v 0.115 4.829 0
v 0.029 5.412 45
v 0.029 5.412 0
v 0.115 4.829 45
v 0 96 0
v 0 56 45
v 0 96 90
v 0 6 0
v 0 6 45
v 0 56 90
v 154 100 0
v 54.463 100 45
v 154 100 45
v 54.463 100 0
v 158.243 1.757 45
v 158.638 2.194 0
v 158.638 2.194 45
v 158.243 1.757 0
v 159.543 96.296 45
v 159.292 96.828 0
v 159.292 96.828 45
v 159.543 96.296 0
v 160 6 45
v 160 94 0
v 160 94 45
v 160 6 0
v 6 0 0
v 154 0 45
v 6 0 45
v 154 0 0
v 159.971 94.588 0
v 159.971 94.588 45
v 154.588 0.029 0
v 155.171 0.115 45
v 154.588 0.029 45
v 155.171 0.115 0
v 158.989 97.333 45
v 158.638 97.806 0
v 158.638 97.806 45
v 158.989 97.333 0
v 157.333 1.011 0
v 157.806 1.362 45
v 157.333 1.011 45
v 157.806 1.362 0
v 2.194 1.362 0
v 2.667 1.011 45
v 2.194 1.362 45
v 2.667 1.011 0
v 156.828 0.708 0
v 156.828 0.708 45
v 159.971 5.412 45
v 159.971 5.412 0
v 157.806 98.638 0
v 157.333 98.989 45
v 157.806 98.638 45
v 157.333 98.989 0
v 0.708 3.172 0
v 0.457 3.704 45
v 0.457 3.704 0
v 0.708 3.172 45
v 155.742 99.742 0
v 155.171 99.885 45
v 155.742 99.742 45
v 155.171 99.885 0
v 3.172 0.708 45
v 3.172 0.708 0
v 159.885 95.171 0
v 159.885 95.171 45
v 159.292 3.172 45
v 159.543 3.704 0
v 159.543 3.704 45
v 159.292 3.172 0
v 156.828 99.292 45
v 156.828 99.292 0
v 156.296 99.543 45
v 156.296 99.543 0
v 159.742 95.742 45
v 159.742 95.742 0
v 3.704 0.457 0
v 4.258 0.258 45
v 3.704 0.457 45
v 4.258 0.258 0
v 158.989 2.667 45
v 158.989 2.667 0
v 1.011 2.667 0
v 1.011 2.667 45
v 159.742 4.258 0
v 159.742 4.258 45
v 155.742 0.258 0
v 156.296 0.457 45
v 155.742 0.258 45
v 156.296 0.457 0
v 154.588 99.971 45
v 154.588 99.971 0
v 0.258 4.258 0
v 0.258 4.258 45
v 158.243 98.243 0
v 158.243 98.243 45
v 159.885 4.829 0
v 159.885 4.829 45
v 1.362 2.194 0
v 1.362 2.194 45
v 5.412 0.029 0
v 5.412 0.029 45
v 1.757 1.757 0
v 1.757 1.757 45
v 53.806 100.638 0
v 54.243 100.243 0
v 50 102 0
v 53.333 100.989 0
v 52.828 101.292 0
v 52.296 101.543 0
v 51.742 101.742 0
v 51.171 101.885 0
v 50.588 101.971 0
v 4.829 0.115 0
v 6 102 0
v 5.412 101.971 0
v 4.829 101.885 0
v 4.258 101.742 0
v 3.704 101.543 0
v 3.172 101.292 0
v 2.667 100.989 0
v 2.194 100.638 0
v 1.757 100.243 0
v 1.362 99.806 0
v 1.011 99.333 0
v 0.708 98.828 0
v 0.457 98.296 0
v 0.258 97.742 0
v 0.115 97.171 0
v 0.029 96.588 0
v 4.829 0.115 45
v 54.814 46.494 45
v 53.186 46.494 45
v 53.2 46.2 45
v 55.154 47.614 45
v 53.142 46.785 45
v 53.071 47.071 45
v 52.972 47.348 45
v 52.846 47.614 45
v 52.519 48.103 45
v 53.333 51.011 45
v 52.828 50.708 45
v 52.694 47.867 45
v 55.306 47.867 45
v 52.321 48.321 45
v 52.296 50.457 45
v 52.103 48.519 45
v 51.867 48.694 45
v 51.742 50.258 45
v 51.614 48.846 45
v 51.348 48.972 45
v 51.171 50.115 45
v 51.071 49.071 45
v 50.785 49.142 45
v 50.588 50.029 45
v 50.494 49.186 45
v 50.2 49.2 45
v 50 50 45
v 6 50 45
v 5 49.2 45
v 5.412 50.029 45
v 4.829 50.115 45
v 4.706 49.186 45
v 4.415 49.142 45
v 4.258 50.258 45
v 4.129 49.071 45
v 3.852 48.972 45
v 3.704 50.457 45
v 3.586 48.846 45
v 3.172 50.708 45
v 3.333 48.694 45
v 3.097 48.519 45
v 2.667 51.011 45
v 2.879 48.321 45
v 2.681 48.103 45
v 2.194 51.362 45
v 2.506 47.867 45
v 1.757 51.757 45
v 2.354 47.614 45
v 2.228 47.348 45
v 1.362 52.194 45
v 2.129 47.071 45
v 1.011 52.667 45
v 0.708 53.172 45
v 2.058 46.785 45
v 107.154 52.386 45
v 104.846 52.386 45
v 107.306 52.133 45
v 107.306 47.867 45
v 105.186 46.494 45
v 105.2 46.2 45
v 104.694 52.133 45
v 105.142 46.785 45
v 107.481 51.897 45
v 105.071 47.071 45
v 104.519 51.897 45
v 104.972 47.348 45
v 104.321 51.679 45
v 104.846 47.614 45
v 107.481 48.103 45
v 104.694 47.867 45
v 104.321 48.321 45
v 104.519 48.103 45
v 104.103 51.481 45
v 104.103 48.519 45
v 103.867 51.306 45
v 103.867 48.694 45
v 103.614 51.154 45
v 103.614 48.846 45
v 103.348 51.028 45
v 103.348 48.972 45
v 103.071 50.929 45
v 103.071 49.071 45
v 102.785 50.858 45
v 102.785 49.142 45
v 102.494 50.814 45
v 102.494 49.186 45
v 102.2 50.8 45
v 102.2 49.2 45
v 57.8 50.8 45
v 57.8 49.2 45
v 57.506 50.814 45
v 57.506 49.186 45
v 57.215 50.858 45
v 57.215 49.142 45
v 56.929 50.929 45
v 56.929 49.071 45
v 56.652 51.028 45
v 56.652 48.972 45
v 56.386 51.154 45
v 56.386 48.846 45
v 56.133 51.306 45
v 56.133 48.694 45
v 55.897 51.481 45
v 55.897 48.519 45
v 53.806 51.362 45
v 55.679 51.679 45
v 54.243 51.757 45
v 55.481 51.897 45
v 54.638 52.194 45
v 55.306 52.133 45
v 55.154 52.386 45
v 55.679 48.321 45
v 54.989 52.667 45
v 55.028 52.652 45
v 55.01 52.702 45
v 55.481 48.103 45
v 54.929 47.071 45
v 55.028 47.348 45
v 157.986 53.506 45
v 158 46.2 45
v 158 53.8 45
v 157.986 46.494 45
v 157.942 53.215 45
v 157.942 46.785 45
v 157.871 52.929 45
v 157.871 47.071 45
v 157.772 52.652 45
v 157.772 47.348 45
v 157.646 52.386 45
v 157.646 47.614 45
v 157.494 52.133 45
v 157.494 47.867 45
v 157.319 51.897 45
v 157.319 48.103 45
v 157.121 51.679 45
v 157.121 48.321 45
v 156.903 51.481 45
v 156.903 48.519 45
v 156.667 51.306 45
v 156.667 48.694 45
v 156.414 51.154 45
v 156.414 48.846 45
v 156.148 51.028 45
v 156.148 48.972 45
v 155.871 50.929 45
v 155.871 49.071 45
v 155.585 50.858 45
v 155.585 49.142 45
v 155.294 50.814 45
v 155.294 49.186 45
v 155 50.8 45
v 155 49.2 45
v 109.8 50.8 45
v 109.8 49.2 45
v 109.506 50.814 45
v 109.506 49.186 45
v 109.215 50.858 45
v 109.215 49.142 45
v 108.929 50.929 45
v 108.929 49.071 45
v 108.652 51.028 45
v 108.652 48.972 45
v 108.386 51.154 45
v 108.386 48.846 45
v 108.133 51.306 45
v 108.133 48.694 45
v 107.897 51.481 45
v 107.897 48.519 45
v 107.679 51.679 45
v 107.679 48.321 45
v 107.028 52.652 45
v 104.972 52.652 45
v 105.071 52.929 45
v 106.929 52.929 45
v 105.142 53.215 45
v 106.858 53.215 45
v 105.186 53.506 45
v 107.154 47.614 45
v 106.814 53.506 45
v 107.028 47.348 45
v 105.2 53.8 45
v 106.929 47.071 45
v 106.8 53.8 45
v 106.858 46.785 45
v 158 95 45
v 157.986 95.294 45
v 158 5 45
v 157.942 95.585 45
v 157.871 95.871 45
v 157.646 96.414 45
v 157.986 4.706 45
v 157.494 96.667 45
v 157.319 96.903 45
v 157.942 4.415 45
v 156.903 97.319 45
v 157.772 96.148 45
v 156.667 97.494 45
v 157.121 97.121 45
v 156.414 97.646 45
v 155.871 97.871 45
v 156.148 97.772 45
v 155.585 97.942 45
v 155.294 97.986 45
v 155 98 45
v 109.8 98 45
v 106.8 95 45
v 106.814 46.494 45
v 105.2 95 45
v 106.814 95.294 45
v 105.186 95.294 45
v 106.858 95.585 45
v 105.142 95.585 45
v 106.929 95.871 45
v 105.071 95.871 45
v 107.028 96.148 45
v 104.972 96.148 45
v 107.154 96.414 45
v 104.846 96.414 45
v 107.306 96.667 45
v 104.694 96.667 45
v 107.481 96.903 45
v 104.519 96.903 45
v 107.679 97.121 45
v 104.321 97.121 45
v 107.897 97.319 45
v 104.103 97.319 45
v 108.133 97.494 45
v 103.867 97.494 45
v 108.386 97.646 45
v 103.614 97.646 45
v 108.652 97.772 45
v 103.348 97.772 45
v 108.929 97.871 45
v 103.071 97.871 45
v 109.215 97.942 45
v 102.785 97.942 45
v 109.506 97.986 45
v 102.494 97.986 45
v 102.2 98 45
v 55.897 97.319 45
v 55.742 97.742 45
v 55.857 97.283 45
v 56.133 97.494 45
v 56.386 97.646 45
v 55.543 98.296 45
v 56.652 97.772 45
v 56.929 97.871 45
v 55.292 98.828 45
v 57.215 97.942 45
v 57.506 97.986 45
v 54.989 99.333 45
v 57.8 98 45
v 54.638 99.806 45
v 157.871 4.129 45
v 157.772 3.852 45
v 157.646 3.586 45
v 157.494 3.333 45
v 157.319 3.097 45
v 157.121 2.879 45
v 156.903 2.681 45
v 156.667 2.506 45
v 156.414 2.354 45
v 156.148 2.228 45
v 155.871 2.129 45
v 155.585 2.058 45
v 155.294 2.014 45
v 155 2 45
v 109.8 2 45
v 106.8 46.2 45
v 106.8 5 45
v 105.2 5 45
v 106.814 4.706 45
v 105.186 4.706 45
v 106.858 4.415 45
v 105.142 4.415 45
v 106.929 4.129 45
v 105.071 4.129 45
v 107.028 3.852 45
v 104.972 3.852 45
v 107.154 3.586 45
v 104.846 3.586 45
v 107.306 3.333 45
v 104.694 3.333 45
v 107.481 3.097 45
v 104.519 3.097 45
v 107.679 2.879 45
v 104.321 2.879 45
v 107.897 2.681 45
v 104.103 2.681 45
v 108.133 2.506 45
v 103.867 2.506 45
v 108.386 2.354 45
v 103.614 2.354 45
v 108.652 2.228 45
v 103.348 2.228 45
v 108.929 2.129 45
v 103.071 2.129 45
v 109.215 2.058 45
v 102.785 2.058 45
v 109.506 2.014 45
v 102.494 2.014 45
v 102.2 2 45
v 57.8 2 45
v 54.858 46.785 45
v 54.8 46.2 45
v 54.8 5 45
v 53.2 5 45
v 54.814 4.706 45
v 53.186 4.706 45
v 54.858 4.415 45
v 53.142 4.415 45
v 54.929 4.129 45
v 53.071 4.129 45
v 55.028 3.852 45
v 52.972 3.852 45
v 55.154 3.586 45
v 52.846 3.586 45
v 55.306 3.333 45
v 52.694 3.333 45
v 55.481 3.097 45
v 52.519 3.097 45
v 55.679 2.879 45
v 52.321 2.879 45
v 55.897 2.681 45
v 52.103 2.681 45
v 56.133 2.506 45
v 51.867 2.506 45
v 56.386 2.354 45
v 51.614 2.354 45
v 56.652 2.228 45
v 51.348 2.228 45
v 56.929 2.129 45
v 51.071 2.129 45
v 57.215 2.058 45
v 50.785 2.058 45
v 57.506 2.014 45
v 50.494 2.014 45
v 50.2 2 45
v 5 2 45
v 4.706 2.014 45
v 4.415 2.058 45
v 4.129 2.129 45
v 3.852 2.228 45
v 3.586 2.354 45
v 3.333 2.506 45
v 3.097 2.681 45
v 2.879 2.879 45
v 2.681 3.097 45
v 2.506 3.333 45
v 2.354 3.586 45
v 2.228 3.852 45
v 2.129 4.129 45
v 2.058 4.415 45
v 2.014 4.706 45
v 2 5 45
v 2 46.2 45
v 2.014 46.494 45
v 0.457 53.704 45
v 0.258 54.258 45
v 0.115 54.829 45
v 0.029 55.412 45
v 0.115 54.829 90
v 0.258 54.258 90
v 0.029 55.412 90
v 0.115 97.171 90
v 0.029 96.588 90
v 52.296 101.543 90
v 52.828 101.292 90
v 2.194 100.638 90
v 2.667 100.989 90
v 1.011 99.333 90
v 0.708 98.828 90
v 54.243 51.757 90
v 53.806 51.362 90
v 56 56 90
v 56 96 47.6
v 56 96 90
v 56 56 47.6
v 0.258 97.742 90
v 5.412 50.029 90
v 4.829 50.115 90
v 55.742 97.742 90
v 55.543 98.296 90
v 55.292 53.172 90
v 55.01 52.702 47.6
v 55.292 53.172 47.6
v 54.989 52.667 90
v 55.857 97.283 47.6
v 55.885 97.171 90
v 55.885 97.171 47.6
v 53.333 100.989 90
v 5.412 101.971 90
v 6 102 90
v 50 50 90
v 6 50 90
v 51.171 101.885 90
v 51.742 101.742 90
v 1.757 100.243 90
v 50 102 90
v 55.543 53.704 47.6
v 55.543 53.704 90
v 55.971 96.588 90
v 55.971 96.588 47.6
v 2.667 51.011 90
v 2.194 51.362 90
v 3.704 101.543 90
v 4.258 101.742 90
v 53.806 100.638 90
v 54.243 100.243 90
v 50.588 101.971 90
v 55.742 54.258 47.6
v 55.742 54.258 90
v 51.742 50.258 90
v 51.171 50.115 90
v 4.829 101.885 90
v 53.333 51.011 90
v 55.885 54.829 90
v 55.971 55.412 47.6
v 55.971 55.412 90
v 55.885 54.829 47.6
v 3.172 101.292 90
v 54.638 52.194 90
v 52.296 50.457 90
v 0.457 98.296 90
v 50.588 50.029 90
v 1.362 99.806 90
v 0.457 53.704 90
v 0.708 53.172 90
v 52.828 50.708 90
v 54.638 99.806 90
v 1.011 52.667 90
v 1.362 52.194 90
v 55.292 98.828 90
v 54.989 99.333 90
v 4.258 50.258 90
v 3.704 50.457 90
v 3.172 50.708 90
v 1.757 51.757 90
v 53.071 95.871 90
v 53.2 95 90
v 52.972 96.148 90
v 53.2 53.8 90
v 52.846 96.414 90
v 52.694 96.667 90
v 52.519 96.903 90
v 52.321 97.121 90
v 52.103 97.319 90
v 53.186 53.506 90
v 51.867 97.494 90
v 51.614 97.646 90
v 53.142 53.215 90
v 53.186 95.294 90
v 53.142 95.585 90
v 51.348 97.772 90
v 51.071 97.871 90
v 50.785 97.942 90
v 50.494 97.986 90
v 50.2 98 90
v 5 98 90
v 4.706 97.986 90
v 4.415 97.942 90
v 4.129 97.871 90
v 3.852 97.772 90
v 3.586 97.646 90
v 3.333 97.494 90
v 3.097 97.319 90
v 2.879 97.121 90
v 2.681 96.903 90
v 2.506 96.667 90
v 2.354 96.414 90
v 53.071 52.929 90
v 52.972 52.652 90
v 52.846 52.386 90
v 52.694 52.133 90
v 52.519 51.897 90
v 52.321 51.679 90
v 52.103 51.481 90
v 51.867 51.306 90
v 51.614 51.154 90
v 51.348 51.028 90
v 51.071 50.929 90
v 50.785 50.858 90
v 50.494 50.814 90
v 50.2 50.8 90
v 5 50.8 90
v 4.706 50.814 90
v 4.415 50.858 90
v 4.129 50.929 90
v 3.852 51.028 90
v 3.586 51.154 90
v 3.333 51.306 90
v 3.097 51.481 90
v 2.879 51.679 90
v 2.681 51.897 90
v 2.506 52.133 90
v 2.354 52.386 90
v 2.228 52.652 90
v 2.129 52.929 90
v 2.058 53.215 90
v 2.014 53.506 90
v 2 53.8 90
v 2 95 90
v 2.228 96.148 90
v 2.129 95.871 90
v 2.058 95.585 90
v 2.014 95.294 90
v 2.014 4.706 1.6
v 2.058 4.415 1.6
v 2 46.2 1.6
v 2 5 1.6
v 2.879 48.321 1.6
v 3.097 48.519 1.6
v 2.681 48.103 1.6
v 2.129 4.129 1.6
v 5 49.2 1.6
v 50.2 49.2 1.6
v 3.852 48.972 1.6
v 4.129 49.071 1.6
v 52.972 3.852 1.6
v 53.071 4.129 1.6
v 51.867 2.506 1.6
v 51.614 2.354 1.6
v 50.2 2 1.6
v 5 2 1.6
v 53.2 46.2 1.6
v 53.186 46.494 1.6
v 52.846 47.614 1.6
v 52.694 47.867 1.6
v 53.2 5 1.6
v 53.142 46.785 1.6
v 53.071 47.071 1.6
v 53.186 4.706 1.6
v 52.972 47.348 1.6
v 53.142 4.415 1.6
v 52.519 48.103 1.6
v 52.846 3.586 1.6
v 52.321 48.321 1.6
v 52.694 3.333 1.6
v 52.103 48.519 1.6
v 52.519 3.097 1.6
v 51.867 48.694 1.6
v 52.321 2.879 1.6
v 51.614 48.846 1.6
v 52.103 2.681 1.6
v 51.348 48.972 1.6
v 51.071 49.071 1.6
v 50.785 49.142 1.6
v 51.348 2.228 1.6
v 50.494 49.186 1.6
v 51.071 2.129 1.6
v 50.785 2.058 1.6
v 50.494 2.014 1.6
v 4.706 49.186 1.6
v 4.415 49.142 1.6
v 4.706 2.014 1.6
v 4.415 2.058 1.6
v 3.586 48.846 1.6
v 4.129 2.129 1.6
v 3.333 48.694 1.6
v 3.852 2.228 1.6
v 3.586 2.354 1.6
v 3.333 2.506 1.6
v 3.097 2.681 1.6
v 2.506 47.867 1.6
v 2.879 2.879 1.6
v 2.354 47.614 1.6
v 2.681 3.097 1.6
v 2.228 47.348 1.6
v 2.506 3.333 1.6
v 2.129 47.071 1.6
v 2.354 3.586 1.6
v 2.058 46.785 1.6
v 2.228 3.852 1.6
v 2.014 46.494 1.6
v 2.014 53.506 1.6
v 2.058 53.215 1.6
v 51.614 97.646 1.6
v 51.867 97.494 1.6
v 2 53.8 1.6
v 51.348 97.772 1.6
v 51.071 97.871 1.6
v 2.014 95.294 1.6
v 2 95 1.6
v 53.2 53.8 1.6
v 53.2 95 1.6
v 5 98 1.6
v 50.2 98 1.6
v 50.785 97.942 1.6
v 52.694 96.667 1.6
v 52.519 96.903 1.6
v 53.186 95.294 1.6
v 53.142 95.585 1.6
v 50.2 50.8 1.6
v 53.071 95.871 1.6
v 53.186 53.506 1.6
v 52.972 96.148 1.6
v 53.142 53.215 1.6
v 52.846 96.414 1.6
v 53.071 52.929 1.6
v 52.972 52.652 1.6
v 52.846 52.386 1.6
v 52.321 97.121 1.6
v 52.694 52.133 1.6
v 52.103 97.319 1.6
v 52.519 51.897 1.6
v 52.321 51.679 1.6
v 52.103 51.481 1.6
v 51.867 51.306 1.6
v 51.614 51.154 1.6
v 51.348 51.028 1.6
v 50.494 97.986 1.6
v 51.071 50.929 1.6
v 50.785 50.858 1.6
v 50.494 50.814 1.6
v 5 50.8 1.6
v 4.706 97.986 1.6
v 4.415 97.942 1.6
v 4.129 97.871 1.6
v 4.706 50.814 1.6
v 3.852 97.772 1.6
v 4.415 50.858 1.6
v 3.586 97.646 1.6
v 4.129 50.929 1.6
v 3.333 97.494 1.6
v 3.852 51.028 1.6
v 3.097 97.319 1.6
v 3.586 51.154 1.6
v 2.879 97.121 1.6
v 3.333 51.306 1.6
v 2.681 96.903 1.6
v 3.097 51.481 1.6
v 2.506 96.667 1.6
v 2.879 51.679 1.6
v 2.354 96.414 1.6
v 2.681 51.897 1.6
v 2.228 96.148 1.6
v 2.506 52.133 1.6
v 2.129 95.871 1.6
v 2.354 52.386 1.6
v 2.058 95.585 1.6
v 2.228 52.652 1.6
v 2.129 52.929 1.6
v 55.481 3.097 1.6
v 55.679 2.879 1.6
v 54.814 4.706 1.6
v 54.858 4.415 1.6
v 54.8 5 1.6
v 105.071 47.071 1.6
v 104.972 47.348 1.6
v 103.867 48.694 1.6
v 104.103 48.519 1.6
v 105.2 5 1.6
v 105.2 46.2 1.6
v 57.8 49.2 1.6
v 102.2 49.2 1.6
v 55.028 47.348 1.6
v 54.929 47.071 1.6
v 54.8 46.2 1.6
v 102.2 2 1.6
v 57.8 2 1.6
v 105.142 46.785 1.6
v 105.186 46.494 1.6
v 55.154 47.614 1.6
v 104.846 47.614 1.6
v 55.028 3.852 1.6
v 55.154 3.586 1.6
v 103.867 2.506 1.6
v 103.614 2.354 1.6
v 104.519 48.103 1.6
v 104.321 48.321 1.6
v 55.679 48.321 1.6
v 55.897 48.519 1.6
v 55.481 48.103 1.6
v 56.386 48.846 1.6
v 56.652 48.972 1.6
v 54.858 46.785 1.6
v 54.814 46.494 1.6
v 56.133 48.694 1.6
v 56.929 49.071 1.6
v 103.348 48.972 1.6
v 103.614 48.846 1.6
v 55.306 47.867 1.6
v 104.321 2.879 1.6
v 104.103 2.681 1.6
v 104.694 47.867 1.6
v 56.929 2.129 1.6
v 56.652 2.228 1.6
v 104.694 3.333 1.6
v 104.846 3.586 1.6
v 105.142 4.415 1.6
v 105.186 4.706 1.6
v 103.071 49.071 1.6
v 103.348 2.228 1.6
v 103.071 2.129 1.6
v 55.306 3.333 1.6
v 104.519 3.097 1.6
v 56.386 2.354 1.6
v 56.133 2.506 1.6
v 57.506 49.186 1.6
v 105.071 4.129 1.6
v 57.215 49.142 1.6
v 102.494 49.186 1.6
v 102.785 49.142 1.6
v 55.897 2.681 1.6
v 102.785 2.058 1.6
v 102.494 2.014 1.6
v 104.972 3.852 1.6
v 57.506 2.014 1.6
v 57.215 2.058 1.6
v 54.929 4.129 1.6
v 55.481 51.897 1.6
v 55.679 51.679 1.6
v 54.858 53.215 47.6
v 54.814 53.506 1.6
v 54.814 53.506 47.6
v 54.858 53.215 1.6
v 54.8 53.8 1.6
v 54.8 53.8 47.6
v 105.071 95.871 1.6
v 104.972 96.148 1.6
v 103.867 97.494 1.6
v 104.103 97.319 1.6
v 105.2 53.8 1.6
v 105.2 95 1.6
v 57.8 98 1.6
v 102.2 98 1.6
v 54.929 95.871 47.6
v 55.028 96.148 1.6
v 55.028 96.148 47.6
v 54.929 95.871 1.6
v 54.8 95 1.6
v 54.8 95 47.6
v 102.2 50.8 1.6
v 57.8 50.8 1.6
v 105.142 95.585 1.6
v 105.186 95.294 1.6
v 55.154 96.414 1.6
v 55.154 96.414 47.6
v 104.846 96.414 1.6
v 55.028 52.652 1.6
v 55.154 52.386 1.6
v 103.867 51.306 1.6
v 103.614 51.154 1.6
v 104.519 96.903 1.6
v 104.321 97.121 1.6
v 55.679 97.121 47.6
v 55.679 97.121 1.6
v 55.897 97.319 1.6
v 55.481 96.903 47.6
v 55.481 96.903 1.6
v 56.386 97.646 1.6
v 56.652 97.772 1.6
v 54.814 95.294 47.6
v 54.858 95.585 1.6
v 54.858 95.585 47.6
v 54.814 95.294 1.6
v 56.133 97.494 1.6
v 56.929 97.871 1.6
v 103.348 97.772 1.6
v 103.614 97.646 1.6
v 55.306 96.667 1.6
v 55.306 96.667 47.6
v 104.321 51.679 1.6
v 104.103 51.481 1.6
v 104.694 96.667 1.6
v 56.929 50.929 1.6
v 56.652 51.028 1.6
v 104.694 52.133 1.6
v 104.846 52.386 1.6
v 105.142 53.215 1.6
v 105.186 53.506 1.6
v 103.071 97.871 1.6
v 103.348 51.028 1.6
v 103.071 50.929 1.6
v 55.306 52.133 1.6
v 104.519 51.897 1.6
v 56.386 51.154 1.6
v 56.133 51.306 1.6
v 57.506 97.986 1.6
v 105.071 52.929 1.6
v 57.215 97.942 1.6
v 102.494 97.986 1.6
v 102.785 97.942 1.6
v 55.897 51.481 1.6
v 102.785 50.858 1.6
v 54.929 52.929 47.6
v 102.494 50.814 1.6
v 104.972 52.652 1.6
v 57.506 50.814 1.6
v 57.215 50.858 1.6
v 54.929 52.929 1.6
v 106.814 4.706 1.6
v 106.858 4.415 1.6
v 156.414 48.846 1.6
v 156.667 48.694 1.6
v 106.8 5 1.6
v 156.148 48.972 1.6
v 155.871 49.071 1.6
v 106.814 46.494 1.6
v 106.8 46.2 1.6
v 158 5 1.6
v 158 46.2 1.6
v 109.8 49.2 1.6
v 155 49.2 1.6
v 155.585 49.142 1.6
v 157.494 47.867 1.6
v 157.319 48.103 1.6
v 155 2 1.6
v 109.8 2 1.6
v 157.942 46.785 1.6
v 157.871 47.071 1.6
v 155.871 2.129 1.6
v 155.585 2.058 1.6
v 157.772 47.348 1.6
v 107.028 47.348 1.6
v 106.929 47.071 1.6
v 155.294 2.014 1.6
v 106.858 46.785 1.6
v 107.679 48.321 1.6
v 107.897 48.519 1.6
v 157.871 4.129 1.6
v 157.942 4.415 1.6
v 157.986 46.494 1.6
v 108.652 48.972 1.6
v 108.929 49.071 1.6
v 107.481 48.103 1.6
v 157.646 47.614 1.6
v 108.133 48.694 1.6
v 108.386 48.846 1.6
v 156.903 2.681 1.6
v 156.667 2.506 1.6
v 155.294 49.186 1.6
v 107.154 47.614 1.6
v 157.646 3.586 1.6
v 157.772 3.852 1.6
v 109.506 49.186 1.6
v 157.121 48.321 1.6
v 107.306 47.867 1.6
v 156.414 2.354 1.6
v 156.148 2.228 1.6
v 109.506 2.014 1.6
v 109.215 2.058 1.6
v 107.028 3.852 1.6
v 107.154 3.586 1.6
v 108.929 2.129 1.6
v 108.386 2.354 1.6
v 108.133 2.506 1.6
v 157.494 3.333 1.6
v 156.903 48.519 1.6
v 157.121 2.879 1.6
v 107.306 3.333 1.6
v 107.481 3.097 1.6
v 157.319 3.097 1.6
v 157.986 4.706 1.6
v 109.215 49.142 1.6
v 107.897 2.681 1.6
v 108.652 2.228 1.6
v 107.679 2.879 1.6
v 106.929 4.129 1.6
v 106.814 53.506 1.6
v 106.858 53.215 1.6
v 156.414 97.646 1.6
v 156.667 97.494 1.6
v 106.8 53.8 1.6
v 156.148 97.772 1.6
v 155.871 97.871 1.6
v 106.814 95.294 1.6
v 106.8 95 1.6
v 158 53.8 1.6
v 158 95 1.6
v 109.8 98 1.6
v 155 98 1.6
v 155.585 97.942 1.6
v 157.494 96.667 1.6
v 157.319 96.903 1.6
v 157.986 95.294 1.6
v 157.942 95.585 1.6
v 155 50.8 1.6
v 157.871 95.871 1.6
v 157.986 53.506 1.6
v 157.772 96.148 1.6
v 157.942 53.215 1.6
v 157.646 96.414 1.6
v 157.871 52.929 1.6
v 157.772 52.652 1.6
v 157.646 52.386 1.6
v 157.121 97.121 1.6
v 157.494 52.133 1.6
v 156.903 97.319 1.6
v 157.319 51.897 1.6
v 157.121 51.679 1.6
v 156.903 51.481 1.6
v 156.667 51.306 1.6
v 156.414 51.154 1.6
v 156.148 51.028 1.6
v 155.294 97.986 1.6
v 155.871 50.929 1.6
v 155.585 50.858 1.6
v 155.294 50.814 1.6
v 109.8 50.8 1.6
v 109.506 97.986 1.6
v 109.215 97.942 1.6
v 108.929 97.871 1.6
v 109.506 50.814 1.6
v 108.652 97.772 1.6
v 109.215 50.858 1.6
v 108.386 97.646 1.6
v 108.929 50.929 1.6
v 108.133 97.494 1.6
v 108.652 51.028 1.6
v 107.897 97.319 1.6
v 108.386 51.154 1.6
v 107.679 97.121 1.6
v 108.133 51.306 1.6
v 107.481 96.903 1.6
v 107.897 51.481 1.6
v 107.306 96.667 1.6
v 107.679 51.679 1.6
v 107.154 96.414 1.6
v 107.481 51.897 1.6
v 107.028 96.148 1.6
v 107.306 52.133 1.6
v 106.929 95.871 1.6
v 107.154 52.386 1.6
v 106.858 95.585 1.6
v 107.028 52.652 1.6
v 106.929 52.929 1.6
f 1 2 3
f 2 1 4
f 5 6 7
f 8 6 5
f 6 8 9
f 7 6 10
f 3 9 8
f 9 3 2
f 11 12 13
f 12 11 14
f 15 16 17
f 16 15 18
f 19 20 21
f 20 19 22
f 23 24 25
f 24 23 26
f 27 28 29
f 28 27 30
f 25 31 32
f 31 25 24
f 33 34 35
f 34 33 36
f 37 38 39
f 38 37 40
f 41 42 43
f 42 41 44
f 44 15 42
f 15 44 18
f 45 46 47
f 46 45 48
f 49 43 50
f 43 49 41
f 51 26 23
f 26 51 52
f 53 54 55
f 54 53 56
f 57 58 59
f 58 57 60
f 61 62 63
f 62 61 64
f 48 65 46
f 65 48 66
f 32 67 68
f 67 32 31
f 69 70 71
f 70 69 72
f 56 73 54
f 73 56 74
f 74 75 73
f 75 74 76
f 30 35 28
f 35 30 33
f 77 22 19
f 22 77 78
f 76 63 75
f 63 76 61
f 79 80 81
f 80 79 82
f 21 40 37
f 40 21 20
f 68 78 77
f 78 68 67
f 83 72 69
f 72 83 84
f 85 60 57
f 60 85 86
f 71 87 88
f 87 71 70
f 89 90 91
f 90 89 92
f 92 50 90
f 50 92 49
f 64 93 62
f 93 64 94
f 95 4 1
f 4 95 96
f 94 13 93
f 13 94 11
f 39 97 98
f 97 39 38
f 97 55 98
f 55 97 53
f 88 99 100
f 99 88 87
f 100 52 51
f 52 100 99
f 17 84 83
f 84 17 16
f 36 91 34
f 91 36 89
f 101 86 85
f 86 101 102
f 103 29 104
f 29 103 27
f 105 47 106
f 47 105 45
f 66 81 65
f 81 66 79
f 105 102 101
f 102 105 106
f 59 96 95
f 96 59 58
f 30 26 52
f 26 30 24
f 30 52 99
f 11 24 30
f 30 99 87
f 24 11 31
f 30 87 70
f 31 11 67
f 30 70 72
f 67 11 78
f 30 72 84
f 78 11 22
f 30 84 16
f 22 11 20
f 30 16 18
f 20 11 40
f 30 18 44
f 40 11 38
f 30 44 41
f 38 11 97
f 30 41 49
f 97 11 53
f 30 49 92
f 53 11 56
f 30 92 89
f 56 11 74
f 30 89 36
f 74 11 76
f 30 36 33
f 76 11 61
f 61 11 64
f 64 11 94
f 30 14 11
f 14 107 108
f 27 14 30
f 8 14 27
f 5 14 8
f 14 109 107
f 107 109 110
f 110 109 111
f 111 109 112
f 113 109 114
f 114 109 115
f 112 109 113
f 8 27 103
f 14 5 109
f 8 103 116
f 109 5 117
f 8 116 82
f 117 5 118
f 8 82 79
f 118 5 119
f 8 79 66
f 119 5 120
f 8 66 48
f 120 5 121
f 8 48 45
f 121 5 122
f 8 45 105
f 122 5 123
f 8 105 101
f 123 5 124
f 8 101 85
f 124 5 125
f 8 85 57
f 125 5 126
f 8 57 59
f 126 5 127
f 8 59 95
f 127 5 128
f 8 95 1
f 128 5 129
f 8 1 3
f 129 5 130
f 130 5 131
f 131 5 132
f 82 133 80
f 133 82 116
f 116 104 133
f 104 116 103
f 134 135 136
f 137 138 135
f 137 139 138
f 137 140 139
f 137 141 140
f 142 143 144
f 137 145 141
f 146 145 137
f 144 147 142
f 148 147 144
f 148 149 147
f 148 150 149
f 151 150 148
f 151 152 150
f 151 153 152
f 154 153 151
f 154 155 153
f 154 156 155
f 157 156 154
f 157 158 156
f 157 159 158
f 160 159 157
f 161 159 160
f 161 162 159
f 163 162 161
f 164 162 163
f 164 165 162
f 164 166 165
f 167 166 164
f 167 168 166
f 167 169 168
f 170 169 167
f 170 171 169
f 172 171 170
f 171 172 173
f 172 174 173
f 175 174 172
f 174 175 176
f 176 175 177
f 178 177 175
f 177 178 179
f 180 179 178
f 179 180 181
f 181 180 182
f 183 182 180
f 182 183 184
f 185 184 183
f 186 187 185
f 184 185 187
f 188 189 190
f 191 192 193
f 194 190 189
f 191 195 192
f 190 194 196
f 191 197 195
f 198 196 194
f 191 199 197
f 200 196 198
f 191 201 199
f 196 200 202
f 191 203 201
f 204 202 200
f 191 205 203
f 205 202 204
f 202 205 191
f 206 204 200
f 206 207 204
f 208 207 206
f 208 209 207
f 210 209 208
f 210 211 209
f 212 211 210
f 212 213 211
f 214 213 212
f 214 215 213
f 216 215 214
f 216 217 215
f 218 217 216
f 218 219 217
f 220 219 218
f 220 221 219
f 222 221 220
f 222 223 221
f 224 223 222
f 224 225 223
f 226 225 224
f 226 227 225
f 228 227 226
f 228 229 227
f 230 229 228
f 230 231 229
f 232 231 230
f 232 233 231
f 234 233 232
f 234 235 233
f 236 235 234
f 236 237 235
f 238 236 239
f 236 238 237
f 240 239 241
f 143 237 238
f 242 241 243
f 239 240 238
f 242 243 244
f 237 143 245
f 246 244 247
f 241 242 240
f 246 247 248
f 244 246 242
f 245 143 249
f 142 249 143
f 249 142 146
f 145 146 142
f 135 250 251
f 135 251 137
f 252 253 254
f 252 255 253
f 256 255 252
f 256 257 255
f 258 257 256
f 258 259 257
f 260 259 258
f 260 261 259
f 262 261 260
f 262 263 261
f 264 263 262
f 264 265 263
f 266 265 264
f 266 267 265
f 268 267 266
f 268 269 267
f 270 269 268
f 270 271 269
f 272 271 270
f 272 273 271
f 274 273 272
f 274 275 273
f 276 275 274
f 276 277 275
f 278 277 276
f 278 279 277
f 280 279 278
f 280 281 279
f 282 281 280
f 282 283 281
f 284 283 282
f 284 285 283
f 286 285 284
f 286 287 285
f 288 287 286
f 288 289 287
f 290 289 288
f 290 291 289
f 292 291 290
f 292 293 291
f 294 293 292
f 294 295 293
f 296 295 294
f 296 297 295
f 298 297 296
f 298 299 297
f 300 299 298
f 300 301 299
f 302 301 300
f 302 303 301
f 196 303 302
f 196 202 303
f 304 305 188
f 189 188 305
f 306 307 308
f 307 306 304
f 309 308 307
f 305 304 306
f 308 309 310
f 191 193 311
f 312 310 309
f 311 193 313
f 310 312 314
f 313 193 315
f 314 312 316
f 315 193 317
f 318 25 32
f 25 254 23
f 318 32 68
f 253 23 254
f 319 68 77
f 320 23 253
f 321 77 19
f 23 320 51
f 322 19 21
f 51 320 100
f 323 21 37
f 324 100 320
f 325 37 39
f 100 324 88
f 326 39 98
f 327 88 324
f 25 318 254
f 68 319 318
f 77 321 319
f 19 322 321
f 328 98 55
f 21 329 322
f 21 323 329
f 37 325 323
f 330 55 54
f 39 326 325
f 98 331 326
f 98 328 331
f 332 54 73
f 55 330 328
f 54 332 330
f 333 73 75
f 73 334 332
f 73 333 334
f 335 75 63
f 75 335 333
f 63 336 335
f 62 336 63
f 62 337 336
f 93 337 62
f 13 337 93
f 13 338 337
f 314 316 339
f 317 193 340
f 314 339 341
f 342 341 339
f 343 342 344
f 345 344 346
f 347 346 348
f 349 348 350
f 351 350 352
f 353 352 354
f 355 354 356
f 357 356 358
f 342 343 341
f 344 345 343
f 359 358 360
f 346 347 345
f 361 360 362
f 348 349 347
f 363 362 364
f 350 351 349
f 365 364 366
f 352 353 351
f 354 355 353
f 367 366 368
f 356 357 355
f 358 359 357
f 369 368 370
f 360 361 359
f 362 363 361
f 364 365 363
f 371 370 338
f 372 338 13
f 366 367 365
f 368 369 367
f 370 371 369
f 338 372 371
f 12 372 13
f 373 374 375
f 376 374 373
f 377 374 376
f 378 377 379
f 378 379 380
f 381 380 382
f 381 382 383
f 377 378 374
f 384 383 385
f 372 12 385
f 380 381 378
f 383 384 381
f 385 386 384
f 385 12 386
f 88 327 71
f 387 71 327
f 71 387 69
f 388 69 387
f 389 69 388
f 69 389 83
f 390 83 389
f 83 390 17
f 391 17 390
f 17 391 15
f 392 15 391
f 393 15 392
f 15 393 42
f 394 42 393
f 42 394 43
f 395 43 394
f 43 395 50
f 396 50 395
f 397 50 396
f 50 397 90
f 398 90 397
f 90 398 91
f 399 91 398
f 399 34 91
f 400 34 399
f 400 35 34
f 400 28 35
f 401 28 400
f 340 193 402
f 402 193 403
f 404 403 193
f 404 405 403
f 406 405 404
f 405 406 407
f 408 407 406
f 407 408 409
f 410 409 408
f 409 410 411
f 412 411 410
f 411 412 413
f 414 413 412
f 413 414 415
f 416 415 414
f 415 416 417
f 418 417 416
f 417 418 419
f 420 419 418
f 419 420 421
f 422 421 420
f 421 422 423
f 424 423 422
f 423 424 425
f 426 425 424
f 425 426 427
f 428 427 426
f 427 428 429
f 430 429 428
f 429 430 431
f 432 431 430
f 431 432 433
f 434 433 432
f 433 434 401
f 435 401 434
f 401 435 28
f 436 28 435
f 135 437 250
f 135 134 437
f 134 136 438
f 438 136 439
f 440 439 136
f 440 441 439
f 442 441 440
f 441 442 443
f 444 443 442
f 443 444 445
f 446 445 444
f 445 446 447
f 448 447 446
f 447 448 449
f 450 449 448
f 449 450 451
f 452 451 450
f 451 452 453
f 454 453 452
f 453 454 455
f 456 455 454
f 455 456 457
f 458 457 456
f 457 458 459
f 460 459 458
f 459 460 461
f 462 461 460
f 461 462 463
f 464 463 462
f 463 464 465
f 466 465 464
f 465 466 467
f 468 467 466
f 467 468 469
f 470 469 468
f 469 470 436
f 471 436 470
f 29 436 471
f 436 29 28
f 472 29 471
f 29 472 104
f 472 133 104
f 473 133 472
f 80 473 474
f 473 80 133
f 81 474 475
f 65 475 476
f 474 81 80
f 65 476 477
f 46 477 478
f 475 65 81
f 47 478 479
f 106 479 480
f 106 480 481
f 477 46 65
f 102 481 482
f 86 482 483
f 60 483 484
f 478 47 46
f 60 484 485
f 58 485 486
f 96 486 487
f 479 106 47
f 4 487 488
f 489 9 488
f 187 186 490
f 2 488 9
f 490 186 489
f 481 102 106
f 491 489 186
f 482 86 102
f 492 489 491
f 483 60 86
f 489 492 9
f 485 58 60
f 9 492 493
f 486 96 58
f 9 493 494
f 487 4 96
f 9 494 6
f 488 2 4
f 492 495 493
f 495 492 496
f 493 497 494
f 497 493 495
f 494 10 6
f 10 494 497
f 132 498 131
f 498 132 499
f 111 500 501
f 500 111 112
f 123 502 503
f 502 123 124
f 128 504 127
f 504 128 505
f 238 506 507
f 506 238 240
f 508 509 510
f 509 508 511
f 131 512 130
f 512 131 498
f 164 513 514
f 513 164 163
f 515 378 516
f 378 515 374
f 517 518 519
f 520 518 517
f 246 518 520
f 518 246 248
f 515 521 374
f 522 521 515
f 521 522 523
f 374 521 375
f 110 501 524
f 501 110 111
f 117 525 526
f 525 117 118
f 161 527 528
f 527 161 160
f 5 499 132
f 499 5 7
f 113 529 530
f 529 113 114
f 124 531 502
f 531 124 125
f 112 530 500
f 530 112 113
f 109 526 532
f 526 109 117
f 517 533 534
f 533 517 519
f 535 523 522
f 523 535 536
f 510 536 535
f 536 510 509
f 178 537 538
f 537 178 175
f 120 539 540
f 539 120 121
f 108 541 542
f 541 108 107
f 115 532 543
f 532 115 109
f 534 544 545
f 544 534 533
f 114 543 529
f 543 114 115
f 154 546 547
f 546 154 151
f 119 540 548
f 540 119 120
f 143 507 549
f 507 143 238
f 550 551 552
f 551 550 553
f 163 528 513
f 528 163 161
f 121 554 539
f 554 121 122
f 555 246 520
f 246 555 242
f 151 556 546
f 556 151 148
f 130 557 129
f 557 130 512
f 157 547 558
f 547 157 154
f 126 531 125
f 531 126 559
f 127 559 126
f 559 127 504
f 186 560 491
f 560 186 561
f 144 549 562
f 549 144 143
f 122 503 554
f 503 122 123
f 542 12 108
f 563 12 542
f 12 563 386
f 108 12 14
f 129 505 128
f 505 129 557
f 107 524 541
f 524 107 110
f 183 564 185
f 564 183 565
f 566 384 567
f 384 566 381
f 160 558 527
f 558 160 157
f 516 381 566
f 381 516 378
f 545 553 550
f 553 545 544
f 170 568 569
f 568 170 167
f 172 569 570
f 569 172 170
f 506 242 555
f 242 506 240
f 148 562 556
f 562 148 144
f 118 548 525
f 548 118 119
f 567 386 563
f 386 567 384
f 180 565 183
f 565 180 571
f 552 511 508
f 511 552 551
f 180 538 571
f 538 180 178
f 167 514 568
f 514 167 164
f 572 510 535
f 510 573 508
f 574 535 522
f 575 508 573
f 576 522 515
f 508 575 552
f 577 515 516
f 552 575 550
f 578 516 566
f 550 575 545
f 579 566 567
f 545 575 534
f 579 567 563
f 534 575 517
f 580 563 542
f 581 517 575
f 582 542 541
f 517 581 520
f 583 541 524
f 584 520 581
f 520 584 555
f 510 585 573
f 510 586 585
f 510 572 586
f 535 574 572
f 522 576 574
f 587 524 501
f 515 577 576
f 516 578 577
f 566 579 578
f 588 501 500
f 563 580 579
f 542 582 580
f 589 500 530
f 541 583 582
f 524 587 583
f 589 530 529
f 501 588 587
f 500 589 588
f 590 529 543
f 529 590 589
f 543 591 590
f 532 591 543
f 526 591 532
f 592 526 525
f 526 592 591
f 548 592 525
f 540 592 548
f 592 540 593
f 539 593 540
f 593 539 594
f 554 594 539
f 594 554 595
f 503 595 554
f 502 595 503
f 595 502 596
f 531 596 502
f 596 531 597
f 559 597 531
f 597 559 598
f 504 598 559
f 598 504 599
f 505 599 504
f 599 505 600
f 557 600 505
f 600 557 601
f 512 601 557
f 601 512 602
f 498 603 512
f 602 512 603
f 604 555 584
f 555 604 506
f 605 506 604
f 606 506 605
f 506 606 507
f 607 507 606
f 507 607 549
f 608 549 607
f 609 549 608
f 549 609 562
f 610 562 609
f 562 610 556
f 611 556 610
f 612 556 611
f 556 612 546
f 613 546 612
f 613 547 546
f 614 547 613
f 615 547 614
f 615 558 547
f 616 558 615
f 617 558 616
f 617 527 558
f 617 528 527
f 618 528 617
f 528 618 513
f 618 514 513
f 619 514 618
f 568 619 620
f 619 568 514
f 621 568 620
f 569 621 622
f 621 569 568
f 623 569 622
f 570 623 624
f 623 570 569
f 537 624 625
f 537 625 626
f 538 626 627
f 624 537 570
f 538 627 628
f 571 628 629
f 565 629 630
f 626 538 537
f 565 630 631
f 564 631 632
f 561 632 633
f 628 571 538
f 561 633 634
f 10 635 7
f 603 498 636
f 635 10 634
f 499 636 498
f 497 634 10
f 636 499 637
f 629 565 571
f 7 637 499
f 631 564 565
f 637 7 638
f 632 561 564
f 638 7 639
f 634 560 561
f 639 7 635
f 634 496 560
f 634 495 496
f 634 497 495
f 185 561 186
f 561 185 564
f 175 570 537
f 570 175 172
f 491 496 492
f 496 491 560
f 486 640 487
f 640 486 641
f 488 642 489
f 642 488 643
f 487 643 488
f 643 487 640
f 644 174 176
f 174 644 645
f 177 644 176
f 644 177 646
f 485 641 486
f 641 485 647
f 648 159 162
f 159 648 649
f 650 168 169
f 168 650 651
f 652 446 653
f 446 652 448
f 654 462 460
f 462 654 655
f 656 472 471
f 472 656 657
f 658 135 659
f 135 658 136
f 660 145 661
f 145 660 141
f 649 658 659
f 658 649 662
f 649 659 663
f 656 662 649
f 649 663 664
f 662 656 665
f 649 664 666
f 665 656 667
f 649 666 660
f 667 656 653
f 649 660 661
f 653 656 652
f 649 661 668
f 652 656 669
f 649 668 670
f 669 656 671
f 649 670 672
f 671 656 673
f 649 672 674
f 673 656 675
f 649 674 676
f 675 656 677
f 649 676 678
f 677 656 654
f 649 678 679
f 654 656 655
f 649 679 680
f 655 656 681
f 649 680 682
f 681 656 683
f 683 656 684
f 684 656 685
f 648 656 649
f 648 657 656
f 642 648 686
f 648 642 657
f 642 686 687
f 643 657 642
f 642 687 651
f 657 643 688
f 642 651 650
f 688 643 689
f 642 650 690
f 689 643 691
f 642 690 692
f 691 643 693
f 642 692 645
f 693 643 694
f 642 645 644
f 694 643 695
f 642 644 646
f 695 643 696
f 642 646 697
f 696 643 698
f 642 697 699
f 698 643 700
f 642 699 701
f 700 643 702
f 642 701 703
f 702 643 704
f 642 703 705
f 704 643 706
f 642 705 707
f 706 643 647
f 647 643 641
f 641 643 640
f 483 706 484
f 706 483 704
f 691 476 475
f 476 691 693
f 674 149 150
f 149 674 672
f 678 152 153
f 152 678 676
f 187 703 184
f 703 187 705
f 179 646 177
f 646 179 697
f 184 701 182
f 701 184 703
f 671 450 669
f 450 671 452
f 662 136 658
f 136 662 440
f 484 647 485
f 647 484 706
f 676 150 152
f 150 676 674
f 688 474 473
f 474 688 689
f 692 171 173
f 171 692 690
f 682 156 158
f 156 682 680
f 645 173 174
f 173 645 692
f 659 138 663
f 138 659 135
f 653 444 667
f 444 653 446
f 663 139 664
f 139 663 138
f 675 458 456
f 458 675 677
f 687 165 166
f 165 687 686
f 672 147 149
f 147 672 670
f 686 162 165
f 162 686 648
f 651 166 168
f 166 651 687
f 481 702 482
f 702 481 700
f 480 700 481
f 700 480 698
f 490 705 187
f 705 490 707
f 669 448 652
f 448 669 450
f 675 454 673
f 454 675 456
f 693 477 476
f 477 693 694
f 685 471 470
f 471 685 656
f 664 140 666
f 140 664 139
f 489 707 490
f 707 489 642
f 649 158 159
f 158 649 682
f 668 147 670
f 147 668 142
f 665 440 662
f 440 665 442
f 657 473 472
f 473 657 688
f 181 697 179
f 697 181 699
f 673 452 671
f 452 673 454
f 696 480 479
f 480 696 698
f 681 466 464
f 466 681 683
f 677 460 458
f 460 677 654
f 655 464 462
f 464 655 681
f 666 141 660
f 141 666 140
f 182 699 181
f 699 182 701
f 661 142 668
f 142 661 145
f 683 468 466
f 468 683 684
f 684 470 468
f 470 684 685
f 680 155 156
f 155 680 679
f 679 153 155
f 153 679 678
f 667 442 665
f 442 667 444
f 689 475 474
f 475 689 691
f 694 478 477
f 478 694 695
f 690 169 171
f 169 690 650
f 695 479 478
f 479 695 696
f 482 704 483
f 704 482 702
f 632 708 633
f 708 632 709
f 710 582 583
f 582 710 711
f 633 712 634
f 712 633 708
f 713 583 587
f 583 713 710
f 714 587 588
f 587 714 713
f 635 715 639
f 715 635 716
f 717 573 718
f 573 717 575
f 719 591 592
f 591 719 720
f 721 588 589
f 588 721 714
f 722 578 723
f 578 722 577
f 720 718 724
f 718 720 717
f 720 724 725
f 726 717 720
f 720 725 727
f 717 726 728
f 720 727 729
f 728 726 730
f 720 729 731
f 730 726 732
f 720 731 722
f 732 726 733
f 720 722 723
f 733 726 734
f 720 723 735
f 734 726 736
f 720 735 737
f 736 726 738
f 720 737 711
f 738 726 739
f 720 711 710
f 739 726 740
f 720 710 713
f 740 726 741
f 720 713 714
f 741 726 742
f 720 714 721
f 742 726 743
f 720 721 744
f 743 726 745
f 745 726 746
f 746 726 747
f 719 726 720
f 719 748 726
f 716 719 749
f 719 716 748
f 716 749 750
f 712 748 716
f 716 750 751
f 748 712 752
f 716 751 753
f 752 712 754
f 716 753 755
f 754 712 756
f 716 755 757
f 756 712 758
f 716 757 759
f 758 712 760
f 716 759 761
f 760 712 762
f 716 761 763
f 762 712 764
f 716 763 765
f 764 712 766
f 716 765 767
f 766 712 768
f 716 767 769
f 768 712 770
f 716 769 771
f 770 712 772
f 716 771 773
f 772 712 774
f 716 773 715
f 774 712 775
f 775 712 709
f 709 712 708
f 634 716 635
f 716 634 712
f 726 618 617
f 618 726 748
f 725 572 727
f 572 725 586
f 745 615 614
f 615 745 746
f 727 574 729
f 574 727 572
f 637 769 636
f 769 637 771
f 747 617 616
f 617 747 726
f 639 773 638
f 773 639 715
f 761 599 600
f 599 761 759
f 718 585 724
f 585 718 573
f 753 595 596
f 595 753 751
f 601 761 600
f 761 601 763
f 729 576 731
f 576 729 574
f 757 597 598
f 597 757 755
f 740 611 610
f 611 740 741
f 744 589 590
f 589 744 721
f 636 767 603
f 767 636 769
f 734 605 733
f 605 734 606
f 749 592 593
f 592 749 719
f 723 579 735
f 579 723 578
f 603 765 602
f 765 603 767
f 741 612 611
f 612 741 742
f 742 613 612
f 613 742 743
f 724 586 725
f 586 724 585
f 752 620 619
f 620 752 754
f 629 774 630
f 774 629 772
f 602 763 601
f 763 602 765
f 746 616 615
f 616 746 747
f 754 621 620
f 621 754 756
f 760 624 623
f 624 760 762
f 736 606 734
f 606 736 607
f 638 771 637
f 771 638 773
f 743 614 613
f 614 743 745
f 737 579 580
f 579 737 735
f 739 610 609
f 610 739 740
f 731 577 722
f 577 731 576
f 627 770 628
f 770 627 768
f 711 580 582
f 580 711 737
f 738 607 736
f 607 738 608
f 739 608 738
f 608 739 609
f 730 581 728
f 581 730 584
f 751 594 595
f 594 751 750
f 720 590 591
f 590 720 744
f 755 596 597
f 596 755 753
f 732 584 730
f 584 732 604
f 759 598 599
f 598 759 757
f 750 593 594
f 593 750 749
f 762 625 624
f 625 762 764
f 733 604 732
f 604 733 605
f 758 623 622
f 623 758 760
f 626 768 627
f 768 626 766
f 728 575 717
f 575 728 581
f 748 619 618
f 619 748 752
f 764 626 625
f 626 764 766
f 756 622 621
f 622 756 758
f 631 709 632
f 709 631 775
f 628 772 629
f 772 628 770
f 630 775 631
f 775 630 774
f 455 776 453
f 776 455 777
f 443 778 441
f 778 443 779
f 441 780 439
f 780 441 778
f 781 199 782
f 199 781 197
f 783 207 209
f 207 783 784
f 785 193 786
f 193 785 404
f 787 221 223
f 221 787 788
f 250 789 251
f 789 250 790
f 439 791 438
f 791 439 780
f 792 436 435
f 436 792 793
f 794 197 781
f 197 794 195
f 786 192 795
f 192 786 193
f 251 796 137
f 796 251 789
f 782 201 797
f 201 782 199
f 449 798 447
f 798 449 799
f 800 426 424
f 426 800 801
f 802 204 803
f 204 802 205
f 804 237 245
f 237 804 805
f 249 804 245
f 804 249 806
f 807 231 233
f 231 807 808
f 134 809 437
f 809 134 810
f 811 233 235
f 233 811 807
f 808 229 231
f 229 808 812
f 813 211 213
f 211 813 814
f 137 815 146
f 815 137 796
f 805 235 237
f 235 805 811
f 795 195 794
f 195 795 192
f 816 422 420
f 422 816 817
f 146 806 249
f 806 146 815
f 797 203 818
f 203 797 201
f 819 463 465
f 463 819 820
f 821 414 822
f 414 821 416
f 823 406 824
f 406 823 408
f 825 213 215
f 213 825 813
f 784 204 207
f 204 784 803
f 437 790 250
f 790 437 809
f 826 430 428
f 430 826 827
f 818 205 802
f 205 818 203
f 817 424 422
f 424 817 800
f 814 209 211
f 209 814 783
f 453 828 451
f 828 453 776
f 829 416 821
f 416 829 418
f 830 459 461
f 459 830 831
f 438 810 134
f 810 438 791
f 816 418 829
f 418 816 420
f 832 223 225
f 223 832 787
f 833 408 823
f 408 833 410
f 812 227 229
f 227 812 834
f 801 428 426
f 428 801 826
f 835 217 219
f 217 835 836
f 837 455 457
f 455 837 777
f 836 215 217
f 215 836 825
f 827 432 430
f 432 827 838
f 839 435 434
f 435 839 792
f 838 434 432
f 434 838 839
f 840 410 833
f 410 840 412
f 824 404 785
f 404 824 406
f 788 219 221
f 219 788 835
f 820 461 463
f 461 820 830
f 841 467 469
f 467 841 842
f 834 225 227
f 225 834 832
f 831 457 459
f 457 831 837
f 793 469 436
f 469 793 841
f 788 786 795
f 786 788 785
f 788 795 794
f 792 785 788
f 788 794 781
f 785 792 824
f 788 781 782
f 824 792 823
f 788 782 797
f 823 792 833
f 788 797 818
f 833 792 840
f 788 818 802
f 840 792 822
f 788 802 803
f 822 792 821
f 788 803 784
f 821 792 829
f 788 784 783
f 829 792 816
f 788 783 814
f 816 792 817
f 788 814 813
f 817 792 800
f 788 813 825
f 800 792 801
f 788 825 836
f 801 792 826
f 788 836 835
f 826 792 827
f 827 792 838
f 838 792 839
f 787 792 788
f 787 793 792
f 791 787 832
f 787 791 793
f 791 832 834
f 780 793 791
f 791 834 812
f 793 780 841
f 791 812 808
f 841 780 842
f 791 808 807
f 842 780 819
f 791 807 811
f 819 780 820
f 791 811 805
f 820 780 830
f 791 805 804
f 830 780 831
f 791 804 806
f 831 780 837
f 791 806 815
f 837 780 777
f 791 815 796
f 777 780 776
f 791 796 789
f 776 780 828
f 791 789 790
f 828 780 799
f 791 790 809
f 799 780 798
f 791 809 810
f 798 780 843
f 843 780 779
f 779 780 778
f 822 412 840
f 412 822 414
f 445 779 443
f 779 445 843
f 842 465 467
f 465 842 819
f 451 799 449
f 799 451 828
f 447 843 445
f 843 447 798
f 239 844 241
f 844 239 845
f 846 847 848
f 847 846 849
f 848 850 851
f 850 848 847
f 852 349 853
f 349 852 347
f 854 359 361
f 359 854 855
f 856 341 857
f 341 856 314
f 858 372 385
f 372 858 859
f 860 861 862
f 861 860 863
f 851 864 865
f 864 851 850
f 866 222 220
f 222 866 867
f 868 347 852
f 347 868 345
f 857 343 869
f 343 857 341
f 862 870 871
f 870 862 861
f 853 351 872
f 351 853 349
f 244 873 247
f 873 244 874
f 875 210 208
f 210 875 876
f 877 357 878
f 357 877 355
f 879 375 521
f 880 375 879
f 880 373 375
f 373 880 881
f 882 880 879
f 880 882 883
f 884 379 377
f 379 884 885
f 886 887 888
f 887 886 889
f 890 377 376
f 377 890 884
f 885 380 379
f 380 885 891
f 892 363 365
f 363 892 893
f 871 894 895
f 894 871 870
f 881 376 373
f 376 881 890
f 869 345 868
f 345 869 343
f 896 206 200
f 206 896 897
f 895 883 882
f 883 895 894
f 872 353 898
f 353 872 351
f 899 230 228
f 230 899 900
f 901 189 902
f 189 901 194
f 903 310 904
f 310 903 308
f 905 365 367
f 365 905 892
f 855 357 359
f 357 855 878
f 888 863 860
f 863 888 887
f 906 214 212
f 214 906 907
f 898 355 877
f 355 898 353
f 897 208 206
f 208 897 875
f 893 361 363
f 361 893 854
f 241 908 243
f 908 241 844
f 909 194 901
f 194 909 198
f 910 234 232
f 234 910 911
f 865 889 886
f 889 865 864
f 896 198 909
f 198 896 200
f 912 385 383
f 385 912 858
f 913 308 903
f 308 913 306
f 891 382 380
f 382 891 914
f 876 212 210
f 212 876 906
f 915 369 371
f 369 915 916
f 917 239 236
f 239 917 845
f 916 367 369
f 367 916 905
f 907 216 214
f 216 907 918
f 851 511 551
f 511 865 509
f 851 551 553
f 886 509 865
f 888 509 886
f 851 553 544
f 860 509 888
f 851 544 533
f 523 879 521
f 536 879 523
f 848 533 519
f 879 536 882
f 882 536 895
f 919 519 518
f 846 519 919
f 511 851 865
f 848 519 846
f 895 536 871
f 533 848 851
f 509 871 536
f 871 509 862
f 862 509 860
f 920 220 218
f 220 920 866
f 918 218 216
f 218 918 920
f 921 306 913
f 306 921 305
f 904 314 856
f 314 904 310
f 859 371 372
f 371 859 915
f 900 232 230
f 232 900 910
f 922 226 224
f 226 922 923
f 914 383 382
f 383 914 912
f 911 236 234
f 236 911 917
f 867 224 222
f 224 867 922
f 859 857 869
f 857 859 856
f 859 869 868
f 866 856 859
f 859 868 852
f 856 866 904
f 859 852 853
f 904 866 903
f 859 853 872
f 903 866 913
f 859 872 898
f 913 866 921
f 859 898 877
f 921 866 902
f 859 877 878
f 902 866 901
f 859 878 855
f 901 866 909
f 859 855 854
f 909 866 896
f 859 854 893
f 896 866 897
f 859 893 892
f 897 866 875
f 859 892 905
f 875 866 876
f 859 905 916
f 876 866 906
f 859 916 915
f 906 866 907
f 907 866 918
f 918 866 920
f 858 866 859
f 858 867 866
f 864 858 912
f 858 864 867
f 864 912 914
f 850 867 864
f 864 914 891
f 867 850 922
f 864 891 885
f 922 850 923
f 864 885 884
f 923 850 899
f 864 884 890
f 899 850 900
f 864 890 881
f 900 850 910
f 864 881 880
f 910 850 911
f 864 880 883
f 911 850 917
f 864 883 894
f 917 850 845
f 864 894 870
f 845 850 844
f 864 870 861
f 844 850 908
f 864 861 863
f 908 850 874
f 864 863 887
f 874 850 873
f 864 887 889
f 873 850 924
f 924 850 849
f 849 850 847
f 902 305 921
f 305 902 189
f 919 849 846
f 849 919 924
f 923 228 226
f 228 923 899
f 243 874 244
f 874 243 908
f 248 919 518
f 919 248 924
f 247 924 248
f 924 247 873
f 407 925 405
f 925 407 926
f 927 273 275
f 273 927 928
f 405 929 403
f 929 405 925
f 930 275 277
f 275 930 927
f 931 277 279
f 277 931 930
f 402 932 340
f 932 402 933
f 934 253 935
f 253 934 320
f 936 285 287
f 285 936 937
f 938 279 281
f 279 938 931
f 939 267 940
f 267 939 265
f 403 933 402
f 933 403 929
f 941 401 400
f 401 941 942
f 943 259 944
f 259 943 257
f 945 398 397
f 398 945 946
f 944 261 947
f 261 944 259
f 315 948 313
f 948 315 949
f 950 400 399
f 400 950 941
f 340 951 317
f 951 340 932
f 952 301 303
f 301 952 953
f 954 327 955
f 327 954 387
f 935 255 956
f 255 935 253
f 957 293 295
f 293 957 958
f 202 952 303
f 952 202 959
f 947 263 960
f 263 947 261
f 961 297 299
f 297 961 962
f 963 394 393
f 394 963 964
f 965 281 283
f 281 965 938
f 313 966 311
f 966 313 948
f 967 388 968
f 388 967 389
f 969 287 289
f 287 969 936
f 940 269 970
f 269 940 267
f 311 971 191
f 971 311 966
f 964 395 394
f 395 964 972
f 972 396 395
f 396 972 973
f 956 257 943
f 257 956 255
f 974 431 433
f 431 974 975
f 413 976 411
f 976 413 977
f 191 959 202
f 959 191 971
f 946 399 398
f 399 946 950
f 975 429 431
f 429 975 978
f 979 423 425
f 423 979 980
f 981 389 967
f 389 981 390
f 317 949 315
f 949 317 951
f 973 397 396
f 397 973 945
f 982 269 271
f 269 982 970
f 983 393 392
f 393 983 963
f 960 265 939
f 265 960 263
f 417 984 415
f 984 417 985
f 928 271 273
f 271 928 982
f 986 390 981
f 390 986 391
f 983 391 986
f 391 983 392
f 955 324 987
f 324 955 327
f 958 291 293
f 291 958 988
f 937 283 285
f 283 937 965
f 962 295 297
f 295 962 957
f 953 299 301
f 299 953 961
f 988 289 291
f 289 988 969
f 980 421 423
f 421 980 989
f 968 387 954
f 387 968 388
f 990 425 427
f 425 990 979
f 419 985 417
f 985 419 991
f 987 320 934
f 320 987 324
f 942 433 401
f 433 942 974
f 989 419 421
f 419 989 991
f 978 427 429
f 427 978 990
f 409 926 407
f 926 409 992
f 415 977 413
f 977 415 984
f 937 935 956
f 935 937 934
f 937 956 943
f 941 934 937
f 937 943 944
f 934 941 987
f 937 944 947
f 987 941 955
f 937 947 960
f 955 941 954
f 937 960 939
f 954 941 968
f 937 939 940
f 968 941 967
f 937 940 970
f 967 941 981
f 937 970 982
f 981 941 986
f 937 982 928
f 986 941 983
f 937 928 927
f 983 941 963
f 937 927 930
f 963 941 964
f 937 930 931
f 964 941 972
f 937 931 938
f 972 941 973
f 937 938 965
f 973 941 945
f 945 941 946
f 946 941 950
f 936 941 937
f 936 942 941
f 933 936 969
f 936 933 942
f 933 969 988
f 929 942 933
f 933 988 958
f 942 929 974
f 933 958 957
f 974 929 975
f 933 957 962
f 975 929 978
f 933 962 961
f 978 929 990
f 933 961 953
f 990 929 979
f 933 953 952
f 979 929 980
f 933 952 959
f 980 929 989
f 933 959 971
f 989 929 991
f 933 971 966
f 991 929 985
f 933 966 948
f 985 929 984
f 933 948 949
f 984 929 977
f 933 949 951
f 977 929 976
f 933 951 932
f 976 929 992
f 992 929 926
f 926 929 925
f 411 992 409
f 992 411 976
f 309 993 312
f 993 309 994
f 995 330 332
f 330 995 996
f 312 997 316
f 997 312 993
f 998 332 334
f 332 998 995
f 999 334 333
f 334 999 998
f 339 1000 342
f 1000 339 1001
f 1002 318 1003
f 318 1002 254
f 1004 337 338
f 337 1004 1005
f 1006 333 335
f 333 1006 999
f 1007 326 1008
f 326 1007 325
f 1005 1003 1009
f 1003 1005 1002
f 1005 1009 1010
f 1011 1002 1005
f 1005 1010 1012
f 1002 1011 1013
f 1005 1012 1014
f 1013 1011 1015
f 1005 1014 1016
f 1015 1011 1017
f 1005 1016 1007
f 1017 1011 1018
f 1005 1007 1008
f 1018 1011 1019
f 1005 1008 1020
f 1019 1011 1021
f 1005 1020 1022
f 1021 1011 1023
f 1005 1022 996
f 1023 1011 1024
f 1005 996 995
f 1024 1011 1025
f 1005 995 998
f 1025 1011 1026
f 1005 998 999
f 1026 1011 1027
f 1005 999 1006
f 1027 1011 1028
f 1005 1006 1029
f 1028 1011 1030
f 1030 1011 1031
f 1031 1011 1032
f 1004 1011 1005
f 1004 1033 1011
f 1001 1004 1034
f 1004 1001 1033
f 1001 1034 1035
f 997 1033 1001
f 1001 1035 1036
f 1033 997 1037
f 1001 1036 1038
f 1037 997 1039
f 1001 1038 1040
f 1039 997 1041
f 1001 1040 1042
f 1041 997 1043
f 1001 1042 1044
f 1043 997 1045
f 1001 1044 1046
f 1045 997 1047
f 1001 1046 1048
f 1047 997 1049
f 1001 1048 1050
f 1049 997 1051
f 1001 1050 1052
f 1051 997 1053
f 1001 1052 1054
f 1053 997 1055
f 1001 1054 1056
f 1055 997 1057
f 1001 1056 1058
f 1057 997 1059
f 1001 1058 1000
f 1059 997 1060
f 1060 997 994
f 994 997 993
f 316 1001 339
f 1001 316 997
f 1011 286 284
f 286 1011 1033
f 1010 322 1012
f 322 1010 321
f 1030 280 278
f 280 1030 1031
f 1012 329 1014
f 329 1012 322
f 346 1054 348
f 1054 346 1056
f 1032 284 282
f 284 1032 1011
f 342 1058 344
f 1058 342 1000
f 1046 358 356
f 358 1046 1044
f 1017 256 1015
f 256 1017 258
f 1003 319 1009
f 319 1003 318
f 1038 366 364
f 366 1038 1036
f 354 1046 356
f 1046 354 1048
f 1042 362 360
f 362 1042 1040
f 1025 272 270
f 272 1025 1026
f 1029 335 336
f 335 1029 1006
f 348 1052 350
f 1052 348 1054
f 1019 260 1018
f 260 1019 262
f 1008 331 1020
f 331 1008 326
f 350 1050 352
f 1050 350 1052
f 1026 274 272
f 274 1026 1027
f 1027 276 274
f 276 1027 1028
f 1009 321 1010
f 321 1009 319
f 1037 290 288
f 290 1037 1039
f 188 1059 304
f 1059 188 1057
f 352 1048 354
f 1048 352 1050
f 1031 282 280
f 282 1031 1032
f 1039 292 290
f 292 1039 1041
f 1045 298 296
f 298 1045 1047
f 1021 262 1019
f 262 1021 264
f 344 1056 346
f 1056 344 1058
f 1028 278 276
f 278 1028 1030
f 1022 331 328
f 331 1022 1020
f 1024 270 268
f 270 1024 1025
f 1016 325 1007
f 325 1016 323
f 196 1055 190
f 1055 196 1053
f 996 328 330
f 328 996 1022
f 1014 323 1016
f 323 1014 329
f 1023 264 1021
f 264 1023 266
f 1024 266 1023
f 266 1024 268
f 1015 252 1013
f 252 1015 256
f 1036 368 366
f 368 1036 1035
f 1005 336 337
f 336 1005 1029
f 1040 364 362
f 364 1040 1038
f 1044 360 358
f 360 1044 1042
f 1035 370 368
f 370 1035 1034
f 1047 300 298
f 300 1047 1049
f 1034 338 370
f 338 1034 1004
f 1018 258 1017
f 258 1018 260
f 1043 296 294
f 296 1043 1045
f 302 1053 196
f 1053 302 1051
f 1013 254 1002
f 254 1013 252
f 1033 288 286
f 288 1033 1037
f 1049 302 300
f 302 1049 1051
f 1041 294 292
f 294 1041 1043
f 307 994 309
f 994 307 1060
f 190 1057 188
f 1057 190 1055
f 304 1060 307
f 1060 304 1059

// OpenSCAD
// Desk organiser: a tray split into compartments for pens, clips, cards and odds and ends.

/* [Size] */
// Width (mm)
width = 160; // [80:5:240]
// Depth (mm)
depth = 100; // [60:5:200]
// Height (mm)
height = 45; // [20:1:100]

/* [Compartments] */
// Columns
columns = 3; // [1:1:6]
// Rows
rows = 2; // [1:1:4]
// Pen cup
pen_cup = true;
// Pen cup height (mm)
pen_cup_height = 90; // [50:5:140]

/* [Walls] */
// Wall thickness (mm)
wall = 2; // [1.2:0.2:4]
// Divider thickness (mm)
divider = 1.6; // [1.2:0.2:3]
// Corner radius (mm)
corner = 6; // [1:1:15]
// Floor thickness (mm)
floor_t = 1.6; // [1:0.2:3]

/* [Hidden] */
$fn = $preview ? 32 : 64;
cw = (width - 2 * wall) / columns;
rd = (depth - 2 * wall) / rows;

module rr(w, d, r) hull() for (x = [r, w - r], y = [r, d - r]) translate([x, y]) circle(r);

difference() {
  union() {
    linear_extrude(height) rr(width, depth, corner);
    if (pen_cup)
      translate([0, depth - rd - wall, 0]) linear_extrude(pen_cup_height) rr(cw + 2 * wall, rd + 2 * wall, min(corner, (cw + 2 * wall) / 2 - 0.1));
  }
  // compartments
  for (c = [0 : columns - 1], r = [0 : rows - 1]) {
    tall = pen_cup && c == 0 && r == rows - 1;
    translate([wall + c * cw + (c > 0 ? divider / 2 : 0), wall + r * rd + (r > 0 ? divider / 2 : 0), floor_t])
      linear_extrude((tall ? pen_cup_height : height) + 1)
        rr(cw - (c > 0 ? divider / 2 : 0) - (c < columns - 1 ? divider / 2 : 0),
           rd - (r > 0 ? divider / 2 : 0) - (r < rows - 1 ? divider / 2 : 0),
           max(0.5, min(corner - wall, 3)));
  }
}
